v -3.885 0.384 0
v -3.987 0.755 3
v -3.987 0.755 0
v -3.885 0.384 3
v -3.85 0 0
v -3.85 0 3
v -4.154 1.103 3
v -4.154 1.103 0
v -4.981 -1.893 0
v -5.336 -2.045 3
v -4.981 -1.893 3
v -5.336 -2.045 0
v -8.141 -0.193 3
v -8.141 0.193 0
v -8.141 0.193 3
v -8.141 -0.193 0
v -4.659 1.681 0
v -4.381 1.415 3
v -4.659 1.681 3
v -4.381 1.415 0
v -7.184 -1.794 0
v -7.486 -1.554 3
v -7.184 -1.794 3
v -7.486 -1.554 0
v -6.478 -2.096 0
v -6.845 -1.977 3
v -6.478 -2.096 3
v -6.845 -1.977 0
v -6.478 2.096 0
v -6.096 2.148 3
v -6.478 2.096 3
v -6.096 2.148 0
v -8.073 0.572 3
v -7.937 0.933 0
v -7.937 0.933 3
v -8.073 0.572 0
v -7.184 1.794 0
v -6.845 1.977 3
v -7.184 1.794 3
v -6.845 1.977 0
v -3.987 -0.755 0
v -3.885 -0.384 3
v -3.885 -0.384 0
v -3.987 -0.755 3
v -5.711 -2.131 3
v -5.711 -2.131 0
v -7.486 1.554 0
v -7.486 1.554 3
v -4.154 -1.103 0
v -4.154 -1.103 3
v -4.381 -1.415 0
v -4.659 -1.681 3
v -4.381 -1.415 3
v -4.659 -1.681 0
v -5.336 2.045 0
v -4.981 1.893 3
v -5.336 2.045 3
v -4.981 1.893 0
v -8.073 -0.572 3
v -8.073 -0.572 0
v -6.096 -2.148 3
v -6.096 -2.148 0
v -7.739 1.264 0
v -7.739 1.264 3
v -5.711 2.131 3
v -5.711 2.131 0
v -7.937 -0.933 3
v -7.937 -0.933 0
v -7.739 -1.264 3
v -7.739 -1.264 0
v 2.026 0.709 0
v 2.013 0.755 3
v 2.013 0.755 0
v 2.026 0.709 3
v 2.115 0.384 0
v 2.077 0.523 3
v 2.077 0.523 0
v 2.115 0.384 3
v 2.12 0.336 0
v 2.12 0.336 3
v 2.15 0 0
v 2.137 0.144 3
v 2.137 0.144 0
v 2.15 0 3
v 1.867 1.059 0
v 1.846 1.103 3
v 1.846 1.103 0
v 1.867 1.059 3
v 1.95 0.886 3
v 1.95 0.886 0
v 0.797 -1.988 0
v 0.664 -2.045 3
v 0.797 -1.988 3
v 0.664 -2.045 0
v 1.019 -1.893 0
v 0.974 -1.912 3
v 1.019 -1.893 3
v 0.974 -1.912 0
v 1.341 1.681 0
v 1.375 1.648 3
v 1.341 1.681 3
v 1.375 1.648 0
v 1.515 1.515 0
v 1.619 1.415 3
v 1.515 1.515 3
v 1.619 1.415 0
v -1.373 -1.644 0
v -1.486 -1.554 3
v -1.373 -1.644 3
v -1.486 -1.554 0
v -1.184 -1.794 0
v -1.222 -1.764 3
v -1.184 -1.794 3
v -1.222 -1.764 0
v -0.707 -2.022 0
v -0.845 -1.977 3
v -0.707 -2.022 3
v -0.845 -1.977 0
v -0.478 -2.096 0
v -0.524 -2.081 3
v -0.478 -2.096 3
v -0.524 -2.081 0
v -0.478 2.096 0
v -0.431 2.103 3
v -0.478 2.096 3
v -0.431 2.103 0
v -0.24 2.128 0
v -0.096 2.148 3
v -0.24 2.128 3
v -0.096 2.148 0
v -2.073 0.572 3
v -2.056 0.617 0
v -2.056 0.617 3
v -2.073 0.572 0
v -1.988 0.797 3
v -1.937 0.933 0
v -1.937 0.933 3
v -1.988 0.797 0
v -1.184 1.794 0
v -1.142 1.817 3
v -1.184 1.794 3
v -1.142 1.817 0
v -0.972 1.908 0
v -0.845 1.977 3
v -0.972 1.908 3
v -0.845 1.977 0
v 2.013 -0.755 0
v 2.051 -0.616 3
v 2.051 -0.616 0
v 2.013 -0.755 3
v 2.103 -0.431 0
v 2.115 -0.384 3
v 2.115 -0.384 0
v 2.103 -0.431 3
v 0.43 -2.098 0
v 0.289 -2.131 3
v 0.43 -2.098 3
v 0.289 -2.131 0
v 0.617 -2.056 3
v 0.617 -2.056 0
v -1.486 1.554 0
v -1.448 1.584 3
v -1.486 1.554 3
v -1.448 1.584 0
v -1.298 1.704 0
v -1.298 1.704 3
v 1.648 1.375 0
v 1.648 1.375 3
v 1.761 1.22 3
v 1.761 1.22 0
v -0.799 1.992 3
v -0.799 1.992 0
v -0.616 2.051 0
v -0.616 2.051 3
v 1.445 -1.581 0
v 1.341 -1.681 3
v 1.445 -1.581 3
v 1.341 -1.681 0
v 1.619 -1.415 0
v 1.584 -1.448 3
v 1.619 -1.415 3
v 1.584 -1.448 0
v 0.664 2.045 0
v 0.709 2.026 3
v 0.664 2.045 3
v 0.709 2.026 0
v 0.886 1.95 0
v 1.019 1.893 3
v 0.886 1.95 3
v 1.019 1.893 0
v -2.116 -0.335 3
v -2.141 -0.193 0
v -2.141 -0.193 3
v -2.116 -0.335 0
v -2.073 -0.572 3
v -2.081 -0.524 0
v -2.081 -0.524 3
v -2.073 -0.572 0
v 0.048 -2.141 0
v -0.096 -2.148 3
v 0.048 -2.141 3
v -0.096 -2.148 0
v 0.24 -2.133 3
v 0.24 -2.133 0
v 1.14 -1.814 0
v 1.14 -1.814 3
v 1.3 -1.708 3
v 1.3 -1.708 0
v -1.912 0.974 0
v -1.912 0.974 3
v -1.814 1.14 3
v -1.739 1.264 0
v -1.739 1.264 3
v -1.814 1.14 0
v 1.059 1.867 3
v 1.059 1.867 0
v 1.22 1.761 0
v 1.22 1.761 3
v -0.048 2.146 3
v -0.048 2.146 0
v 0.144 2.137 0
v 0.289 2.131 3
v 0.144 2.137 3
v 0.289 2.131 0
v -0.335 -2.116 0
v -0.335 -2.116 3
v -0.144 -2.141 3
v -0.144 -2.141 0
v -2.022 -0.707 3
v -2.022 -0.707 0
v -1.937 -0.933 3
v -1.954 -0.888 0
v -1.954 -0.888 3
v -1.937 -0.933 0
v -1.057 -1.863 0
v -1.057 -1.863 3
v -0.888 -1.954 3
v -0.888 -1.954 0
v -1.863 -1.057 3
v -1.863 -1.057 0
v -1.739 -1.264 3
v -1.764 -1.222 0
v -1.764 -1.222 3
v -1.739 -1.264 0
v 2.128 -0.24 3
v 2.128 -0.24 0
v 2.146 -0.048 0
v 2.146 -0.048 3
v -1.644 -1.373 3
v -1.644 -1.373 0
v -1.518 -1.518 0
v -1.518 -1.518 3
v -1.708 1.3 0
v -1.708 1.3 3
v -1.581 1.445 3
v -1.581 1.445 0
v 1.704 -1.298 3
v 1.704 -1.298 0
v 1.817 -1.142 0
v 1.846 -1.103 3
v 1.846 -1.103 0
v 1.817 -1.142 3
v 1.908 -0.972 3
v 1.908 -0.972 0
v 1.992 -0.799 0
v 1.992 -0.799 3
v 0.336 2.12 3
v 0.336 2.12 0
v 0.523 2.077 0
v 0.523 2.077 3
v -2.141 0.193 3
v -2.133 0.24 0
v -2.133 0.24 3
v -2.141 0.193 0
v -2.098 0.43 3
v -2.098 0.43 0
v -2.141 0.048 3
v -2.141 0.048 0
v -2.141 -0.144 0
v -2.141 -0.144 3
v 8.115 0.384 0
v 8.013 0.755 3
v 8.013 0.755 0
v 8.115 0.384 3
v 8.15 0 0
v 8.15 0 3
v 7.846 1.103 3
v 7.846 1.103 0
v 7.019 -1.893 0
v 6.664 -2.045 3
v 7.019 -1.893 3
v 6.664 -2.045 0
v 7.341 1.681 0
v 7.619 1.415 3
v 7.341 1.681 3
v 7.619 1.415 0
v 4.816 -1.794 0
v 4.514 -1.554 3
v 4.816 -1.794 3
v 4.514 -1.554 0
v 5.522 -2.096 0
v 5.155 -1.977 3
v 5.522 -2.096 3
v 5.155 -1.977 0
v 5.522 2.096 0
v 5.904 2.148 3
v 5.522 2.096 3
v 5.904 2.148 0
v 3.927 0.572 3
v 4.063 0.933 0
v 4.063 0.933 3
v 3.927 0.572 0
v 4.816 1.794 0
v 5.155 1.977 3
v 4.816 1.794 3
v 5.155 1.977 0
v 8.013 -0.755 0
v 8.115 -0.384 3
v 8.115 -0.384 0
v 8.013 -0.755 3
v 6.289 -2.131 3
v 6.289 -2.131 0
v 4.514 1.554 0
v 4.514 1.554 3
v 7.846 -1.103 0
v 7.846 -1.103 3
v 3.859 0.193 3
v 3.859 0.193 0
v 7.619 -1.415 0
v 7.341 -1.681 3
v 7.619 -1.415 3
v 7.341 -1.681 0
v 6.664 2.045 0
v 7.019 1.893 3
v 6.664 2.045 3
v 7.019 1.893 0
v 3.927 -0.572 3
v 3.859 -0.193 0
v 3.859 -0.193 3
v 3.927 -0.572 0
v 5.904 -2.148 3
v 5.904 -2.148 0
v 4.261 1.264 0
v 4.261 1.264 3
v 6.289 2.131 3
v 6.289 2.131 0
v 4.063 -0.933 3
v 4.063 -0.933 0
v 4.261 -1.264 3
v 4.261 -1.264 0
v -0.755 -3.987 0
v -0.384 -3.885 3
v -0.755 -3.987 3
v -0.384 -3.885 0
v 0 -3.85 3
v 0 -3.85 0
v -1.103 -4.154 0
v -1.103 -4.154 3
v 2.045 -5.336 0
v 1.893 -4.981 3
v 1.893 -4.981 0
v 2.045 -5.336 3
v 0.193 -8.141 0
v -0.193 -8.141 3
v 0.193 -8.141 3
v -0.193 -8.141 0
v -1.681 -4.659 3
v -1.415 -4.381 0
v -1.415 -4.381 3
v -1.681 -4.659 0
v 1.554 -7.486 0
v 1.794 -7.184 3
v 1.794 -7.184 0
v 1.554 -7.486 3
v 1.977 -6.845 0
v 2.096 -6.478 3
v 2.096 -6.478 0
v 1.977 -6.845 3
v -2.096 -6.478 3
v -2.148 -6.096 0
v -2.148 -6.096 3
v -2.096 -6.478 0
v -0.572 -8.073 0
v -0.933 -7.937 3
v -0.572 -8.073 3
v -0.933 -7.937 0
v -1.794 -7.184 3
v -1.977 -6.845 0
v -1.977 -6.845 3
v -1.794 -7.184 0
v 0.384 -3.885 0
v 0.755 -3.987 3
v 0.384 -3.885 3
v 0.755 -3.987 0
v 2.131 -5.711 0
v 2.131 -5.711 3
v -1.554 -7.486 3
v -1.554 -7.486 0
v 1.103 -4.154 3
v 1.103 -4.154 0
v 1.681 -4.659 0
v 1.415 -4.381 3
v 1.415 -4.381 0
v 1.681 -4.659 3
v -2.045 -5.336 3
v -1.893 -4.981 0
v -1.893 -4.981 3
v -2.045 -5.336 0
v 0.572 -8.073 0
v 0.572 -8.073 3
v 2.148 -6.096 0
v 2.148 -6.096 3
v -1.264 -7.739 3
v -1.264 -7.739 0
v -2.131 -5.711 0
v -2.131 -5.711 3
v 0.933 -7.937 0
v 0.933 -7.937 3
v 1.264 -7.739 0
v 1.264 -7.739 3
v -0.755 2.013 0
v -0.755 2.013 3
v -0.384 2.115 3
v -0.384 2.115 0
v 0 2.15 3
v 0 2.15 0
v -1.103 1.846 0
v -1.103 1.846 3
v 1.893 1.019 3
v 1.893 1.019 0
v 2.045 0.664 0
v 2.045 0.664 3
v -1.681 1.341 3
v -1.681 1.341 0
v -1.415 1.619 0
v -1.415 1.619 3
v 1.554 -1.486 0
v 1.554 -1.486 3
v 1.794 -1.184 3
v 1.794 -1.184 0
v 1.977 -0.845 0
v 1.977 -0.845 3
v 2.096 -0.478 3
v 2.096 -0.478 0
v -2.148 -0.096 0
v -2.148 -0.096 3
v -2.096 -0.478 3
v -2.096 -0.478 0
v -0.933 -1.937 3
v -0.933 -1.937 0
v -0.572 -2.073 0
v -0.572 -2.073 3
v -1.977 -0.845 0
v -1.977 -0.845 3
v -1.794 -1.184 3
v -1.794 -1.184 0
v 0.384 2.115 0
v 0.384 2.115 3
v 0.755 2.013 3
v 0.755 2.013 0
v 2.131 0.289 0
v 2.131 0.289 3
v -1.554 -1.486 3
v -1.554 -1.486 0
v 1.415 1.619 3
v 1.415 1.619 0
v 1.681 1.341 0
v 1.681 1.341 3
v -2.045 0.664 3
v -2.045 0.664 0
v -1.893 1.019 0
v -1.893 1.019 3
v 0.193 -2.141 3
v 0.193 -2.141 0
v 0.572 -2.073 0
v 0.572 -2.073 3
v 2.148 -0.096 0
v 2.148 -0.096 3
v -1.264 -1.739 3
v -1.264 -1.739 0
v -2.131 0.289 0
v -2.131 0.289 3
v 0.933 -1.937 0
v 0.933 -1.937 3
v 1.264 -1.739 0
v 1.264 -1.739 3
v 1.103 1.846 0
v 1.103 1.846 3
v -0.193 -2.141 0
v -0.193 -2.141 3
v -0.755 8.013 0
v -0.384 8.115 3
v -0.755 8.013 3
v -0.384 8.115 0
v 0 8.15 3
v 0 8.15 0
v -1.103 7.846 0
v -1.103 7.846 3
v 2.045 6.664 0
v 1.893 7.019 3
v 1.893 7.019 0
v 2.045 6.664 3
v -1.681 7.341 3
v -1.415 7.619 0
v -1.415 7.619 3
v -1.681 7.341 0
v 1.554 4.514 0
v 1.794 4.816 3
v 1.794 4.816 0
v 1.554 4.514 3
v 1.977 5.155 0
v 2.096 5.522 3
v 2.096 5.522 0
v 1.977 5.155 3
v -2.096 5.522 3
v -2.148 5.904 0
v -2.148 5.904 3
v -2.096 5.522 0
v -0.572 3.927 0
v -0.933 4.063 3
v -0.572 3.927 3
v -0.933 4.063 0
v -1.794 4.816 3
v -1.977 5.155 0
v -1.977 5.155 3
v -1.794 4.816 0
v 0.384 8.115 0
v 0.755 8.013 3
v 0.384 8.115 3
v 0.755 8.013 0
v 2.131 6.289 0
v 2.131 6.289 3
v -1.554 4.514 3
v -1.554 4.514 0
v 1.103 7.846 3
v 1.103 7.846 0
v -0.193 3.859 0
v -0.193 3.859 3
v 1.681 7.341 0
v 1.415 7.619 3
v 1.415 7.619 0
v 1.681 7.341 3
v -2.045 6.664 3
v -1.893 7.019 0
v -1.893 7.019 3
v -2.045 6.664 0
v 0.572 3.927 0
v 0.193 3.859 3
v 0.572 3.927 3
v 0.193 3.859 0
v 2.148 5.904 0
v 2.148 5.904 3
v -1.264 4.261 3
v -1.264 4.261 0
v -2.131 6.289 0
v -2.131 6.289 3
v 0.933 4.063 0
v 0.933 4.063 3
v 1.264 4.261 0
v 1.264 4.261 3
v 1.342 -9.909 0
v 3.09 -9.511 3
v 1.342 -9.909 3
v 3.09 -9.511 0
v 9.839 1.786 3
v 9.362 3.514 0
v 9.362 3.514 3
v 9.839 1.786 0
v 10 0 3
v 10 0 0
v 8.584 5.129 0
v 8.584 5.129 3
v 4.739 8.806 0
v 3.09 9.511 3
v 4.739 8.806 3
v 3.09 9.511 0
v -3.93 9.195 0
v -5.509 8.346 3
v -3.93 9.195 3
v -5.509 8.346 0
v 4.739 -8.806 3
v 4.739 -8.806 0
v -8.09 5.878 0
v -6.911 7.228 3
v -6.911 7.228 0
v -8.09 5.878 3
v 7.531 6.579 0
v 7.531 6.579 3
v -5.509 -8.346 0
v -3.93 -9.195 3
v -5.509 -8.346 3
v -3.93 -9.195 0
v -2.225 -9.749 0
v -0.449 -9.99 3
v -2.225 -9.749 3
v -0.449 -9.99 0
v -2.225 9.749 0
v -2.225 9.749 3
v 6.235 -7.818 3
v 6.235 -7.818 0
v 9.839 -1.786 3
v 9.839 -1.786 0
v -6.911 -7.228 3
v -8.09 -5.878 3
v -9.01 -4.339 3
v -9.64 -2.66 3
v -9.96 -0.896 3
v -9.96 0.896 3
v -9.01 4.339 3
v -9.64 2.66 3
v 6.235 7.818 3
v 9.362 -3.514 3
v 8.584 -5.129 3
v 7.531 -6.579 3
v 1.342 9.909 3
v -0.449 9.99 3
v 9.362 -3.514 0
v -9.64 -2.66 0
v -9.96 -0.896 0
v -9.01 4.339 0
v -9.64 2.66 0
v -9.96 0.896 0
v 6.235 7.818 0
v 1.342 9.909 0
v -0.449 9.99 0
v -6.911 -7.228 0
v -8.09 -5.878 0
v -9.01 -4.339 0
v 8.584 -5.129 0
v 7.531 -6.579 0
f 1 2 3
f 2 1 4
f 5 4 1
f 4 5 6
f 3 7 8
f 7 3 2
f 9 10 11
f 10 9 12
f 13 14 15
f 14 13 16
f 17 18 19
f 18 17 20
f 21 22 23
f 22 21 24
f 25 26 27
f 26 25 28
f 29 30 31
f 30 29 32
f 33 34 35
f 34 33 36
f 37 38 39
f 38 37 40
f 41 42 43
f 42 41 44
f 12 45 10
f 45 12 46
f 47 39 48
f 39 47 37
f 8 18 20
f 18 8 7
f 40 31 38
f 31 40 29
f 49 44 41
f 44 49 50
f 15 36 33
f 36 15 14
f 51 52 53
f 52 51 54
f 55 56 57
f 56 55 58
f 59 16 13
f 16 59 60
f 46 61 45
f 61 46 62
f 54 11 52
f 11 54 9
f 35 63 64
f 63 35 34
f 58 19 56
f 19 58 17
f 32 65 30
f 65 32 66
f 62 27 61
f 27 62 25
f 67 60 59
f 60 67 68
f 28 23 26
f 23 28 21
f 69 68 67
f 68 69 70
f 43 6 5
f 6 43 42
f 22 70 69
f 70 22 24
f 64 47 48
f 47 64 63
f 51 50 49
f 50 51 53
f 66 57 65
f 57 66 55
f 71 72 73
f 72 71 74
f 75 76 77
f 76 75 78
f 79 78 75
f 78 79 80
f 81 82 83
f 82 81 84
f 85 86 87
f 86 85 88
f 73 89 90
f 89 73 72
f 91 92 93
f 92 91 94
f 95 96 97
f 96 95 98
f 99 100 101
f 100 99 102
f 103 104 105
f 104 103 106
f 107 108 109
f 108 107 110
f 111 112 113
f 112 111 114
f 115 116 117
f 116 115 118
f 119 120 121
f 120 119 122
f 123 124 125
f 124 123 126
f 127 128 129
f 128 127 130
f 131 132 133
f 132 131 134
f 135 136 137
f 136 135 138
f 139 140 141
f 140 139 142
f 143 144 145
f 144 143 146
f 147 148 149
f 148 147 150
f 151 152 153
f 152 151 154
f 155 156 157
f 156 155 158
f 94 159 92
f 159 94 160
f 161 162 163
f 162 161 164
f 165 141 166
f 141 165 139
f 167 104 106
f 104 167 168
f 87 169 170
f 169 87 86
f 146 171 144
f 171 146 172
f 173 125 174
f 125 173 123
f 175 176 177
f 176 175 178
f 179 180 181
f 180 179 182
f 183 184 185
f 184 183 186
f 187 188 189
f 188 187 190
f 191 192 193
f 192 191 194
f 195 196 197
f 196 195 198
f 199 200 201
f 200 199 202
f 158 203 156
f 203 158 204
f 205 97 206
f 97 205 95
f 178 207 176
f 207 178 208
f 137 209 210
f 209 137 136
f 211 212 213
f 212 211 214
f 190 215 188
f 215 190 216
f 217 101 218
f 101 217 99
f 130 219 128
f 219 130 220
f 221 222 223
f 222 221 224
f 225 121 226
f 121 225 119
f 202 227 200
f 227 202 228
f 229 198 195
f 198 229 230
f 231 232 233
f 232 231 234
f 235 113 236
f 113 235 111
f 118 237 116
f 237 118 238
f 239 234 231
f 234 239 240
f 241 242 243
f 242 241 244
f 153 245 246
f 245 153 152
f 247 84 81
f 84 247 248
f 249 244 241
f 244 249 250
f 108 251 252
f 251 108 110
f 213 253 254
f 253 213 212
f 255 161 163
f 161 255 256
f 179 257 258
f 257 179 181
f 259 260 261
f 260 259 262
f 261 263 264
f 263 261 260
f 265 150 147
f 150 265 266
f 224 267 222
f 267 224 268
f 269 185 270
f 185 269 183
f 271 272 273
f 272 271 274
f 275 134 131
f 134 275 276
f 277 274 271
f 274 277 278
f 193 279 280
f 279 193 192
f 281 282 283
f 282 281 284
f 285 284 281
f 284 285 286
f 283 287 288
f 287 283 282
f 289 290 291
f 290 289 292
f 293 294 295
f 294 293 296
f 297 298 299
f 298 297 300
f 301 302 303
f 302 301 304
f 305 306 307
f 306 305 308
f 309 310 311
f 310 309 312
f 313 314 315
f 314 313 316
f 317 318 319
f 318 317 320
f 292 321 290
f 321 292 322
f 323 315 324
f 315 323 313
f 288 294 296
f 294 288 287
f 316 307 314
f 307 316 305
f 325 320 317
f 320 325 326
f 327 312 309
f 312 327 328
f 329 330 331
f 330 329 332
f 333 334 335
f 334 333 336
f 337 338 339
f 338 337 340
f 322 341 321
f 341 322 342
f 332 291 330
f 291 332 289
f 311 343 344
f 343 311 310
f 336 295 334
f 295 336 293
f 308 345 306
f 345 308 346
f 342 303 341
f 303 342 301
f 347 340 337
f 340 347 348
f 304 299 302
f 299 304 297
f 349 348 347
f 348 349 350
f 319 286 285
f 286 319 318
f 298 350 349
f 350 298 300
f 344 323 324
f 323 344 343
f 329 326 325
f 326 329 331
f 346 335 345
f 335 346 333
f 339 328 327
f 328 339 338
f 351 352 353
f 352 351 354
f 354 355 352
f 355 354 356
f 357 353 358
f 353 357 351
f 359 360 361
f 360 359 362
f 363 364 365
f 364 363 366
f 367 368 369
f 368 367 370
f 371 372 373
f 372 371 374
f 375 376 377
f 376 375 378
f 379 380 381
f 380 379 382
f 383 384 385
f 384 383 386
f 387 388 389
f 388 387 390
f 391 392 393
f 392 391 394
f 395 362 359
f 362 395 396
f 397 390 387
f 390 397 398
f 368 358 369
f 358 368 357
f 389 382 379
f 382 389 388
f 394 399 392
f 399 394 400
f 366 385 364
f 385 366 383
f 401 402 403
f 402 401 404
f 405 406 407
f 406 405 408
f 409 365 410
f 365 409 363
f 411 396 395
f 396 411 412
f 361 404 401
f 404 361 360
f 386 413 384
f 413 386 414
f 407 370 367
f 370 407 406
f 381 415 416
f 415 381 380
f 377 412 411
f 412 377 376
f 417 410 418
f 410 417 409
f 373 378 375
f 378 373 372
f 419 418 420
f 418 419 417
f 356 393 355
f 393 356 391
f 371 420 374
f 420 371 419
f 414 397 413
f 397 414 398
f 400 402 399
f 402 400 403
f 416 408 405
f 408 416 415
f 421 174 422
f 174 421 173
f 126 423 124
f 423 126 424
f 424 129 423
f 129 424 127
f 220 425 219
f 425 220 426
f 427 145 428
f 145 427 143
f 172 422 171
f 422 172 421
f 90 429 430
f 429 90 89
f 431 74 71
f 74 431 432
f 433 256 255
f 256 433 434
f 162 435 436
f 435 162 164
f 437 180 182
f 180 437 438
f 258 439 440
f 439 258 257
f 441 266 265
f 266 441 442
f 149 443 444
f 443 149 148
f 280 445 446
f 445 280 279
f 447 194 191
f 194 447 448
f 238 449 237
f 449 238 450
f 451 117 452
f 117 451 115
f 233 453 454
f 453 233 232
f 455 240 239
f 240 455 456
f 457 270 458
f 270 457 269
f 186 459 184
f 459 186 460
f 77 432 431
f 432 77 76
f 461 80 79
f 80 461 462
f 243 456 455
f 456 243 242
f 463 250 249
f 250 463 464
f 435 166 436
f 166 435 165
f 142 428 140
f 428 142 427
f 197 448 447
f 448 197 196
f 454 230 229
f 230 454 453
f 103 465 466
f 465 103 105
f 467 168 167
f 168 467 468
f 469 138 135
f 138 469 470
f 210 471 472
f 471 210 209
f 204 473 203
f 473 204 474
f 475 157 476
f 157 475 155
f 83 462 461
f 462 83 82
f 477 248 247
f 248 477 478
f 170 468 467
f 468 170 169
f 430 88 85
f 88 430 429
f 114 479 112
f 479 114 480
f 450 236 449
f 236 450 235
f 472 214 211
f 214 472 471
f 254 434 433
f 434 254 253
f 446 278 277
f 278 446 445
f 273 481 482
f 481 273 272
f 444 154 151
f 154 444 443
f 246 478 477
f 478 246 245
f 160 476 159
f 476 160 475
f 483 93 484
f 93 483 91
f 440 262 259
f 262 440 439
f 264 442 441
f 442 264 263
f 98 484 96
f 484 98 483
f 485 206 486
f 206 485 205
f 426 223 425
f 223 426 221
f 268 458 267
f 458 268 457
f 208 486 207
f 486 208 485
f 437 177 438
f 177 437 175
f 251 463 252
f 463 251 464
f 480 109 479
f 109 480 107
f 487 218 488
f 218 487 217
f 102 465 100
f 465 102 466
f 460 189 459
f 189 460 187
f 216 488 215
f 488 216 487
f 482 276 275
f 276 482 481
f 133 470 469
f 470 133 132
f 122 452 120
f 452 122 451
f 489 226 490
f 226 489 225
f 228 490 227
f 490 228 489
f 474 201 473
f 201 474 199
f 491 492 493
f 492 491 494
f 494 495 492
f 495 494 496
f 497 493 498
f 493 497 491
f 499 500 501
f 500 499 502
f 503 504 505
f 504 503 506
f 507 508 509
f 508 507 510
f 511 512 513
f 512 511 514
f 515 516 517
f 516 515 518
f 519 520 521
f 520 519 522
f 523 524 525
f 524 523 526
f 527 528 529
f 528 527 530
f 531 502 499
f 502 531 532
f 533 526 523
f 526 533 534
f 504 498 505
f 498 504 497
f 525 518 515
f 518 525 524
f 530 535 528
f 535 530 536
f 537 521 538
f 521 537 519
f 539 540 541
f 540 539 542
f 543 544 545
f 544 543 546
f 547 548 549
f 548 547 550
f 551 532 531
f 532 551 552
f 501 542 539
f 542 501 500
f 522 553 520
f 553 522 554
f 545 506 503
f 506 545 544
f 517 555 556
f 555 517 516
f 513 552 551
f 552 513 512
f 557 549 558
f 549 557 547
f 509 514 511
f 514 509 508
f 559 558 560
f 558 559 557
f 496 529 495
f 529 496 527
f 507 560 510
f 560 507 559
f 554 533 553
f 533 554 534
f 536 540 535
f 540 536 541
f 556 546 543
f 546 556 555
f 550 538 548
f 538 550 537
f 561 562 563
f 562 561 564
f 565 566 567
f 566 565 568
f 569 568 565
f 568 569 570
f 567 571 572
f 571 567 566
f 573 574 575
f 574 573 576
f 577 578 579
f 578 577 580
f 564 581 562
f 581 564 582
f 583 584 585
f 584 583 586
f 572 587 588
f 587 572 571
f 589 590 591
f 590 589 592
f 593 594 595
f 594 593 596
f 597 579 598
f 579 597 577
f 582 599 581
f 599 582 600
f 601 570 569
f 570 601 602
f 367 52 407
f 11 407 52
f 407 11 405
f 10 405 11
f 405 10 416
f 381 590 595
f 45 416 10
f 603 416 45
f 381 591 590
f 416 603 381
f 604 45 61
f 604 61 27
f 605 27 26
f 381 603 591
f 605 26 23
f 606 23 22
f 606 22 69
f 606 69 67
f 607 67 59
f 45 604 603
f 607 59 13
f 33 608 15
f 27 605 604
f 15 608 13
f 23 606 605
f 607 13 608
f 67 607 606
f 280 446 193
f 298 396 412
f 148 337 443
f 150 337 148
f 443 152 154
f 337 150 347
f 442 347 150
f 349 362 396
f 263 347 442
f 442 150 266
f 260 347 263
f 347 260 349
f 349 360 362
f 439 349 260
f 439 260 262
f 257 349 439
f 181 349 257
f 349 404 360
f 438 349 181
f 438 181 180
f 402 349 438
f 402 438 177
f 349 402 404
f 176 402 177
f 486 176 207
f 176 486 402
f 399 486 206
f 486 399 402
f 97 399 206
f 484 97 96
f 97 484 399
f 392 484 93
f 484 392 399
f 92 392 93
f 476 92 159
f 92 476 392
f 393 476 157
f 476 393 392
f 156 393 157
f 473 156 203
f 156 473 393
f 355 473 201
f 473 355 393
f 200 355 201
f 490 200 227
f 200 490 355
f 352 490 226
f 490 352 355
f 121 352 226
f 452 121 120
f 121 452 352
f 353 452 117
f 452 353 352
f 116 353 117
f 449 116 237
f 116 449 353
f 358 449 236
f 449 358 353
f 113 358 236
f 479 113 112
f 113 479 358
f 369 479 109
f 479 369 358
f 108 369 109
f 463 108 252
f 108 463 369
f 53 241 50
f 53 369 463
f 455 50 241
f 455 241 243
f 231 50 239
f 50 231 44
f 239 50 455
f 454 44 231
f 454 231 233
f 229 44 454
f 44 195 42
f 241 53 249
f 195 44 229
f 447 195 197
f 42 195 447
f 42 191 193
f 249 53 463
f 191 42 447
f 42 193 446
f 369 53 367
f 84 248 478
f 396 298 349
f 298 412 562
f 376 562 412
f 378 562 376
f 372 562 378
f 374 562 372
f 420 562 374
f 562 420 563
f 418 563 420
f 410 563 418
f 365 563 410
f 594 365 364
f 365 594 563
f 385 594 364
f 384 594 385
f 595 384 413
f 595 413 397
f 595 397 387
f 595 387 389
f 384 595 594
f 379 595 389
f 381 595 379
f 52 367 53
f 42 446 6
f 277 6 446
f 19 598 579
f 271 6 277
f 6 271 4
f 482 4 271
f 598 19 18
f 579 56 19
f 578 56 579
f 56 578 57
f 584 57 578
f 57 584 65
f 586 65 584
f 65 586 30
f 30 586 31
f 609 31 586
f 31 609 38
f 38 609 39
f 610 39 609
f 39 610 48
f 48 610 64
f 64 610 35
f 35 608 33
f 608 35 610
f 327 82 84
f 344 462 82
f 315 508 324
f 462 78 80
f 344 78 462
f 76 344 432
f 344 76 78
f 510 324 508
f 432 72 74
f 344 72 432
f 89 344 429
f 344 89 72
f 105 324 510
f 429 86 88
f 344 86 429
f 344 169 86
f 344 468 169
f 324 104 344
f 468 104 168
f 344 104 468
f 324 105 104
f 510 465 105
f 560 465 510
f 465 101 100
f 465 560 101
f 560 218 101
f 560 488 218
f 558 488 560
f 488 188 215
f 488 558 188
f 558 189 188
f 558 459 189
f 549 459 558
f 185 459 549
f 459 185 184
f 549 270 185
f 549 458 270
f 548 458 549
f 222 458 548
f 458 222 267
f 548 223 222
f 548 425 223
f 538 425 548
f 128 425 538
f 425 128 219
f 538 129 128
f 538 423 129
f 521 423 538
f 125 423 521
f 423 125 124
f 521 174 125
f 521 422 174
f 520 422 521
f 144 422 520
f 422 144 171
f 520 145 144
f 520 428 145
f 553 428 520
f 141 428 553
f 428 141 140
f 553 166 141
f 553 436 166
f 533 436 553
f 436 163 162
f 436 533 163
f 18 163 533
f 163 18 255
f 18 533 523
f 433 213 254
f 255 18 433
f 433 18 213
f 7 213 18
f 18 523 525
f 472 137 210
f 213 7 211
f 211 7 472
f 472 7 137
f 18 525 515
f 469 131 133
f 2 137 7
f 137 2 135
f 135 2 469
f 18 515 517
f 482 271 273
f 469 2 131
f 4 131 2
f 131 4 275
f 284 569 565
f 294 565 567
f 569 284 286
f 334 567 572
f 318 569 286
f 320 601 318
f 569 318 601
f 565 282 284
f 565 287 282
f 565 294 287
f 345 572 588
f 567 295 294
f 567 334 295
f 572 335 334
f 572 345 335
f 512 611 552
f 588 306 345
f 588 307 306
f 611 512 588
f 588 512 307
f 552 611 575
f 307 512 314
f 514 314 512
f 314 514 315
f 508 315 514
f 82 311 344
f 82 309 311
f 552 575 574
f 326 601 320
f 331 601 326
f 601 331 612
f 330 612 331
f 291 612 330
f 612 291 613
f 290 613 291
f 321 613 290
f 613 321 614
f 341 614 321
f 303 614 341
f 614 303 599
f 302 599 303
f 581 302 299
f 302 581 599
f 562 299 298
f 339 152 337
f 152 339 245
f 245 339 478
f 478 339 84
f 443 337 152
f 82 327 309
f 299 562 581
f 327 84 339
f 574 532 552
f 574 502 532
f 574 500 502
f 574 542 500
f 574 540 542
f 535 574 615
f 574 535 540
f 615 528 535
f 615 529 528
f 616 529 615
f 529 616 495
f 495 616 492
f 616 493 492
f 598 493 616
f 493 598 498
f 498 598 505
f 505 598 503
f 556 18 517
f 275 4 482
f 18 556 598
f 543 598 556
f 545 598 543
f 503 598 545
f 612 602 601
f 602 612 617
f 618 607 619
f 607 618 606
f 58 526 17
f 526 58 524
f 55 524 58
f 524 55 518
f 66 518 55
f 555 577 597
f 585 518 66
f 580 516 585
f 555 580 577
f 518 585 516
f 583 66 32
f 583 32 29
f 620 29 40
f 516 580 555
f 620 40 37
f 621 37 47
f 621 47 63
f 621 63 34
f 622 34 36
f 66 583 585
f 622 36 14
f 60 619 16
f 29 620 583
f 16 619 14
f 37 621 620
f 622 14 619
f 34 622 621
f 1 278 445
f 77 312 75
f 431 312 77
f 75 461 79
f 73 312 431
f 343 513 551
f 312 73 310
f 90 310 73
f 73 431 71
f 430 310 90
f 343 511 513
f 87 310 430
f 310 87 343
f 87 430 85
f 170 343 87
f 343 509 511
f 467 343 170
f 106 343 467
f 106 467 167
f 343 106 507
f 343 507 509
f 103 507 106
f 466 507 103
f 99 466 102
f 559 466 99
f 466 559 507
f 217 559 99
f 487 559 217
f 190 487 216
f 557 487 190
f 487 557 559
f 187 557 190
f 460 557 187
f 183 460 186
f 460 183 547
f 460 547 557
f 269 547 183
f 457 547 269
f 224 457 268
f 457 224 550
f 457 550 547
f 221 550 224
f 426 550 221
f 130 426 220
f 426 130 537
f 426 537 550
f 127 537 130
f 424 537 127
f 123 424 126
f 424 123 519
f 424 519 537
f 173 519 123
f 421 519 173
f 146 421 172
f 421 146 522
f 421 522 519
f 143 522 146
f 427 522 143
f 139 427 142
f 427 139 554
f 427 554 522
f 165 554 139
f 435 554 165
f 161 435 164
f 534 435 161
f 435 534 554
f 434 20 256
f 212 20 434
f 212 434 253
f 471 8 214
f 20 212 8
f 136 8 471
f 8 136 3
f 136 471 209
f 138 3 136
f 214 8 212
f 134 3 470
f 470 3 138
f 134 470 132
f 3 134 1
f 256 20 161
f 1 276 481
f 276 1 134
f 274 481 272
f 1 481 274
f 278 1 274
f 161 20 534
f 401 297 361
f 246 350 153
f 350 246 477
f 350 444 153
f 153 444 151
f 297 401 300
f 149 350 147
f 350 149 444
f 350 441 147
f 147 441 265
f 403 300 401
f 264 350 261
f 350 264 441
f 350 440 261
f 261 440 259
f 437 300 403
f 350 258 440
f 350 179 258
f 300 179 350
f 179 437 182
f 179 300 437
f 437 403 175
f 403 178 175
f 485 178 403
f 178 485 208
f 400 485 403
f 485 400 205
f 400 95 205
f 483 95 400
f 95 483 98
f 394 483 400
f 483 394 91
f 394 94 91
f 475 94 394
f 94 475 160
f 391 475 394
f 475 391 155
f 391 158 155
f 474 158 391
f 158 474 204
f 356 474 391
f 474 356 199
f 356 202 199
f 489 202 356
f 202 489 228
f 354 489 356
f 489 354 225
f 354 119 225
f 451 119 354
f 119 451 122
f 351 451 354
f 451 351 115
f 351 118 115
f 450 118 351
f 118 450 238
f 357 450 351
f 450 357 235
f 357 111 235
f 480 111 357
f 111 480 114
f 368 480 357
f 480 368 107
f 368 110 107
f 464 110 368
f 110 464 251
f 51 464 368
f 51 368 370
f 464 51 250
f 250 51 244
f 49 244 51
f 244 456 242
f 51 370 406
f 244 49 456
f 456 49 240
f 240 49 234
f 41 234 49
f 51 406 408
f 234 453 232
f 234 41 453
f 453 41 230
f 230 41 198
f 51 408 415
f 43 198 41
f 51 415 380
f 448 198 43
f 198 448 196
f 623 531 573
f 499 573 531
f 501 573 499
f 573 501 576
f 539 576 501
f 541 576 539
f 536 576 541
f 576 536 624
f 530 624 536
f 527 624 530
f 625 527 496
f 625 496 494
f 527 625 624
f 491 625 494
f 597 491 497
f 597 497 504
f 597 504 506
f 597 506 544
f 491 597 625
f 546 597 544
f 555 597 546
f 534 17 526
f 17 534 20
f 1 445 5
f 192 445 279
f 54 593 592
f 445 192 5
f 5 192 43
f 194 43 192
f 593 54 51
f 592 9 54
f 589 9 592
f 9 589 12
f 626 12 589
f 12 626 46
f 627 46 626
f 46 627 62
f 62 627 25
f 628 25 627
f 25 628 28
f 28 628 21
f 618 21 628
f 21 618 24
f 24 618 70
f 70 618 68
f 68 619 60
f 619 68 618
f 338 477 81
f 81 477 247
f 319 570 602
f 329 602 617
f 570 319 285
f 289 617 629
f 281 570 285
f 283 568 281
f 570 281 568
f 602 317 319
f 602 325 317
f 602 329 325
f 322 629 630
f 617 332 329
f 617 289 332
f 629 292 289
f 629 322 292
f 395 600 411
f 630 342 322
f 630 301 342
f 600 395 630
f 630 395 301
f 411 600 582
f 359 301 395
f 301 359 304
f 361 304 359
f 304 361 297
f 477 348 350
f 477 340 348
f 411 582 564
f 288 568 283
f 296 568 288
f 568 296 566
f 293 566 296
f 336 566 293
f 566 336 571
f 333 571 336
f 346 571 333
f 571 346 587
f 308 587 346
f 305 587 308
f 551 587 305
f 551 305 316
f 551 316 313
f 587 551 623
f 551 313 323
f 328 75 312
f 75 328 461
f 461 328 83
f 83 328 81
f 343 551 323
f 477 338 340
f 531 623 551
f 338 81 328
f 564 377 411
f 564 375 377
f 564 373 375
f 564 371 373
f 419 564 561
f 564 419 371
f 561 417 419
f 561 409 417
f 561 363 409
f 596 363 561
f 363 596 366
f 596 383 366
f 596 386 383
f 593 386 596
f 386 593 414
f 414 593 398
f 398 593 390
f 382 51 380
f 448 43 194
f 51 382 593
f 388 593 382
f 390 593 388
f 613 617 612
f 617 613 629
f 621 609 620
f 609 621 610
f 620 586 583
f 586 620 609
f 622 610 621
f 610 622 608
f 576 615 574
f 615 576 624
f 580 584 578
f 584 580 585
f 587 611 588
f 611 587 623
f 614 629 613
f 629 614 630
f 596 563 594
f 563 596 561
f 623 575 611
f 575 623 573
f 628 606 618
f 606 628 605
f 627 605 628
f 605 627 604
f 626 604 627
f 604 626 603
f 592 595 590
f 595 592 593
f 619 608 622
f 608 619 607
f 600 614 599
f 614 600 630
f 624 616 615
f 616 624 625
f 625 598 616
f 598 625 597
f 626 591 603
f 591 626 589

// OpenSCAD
// file: ../common.scad
// Width of plastic
Width = 2.2;

// Color of the parts
PartsColor = [0.8, 0.8, 0.8];

// Diameter of plastic ollo holes
OlloHoles = 4.3;

// Width of Ollo "real" plastic
OlloWidth = 3;

// Motor dimensions
MotorWidth = 24;
MotorHeight = 36;
MotorDepth = 24;
MotorArmOffset = 9;

// U dimensions
UHeight = 10;
URadius = 8;
UWidth = 30+Width/2;
UTotalHeight = UHeight+URadius;

// Side dimensions
SideSize = 38 + 0;
SideHolesToBorder = 5;

// Size of the body
BodySize = 18;

// Defining the resolution
$fn=35;

// Do an Ollo hole on the part
module olloHole(depth=Width)
{
    translate([0,0,-0.1])
      cylinder(depth+0.2, OlloHoles/2, OlloHoles/2);
}

// Do 3 ollo holes
module threeOllo(depth=Width)
{
  for (xy=[[-6,0],[0,0],[6,0]]) {
    translate([xy[0], xy[1], 0])
    olloHole(depth);
  }
}

// Do a servo arm holes
module servoArm(depth=Width)
{
    threeOllo(depth);
    rotate([0,0,90])
      threeOllo(depth);
}

// Do a rounded cube
module rounded(x=10, y=10, z=10, r=3, center=false) {
  if (center) {
    translate([-(x/2),-(y/2),0])
      rounded(x, y, z, r);
  } else {
    translate([r,r,0])
    minkowski() {
      cube([x-2*r,y-2*r,z/2]);
      cylinder(h=z/2, r=r);
    }
  }
}
// main file
include <../common.scad>;

module arm() {
	color([0.6,0.6,0.6]) {
     	difference() {
		  cylinder(d=20, h=OlloWidth);
		   servoArm(OlloWidth);
	  }
	}
}

arm();
